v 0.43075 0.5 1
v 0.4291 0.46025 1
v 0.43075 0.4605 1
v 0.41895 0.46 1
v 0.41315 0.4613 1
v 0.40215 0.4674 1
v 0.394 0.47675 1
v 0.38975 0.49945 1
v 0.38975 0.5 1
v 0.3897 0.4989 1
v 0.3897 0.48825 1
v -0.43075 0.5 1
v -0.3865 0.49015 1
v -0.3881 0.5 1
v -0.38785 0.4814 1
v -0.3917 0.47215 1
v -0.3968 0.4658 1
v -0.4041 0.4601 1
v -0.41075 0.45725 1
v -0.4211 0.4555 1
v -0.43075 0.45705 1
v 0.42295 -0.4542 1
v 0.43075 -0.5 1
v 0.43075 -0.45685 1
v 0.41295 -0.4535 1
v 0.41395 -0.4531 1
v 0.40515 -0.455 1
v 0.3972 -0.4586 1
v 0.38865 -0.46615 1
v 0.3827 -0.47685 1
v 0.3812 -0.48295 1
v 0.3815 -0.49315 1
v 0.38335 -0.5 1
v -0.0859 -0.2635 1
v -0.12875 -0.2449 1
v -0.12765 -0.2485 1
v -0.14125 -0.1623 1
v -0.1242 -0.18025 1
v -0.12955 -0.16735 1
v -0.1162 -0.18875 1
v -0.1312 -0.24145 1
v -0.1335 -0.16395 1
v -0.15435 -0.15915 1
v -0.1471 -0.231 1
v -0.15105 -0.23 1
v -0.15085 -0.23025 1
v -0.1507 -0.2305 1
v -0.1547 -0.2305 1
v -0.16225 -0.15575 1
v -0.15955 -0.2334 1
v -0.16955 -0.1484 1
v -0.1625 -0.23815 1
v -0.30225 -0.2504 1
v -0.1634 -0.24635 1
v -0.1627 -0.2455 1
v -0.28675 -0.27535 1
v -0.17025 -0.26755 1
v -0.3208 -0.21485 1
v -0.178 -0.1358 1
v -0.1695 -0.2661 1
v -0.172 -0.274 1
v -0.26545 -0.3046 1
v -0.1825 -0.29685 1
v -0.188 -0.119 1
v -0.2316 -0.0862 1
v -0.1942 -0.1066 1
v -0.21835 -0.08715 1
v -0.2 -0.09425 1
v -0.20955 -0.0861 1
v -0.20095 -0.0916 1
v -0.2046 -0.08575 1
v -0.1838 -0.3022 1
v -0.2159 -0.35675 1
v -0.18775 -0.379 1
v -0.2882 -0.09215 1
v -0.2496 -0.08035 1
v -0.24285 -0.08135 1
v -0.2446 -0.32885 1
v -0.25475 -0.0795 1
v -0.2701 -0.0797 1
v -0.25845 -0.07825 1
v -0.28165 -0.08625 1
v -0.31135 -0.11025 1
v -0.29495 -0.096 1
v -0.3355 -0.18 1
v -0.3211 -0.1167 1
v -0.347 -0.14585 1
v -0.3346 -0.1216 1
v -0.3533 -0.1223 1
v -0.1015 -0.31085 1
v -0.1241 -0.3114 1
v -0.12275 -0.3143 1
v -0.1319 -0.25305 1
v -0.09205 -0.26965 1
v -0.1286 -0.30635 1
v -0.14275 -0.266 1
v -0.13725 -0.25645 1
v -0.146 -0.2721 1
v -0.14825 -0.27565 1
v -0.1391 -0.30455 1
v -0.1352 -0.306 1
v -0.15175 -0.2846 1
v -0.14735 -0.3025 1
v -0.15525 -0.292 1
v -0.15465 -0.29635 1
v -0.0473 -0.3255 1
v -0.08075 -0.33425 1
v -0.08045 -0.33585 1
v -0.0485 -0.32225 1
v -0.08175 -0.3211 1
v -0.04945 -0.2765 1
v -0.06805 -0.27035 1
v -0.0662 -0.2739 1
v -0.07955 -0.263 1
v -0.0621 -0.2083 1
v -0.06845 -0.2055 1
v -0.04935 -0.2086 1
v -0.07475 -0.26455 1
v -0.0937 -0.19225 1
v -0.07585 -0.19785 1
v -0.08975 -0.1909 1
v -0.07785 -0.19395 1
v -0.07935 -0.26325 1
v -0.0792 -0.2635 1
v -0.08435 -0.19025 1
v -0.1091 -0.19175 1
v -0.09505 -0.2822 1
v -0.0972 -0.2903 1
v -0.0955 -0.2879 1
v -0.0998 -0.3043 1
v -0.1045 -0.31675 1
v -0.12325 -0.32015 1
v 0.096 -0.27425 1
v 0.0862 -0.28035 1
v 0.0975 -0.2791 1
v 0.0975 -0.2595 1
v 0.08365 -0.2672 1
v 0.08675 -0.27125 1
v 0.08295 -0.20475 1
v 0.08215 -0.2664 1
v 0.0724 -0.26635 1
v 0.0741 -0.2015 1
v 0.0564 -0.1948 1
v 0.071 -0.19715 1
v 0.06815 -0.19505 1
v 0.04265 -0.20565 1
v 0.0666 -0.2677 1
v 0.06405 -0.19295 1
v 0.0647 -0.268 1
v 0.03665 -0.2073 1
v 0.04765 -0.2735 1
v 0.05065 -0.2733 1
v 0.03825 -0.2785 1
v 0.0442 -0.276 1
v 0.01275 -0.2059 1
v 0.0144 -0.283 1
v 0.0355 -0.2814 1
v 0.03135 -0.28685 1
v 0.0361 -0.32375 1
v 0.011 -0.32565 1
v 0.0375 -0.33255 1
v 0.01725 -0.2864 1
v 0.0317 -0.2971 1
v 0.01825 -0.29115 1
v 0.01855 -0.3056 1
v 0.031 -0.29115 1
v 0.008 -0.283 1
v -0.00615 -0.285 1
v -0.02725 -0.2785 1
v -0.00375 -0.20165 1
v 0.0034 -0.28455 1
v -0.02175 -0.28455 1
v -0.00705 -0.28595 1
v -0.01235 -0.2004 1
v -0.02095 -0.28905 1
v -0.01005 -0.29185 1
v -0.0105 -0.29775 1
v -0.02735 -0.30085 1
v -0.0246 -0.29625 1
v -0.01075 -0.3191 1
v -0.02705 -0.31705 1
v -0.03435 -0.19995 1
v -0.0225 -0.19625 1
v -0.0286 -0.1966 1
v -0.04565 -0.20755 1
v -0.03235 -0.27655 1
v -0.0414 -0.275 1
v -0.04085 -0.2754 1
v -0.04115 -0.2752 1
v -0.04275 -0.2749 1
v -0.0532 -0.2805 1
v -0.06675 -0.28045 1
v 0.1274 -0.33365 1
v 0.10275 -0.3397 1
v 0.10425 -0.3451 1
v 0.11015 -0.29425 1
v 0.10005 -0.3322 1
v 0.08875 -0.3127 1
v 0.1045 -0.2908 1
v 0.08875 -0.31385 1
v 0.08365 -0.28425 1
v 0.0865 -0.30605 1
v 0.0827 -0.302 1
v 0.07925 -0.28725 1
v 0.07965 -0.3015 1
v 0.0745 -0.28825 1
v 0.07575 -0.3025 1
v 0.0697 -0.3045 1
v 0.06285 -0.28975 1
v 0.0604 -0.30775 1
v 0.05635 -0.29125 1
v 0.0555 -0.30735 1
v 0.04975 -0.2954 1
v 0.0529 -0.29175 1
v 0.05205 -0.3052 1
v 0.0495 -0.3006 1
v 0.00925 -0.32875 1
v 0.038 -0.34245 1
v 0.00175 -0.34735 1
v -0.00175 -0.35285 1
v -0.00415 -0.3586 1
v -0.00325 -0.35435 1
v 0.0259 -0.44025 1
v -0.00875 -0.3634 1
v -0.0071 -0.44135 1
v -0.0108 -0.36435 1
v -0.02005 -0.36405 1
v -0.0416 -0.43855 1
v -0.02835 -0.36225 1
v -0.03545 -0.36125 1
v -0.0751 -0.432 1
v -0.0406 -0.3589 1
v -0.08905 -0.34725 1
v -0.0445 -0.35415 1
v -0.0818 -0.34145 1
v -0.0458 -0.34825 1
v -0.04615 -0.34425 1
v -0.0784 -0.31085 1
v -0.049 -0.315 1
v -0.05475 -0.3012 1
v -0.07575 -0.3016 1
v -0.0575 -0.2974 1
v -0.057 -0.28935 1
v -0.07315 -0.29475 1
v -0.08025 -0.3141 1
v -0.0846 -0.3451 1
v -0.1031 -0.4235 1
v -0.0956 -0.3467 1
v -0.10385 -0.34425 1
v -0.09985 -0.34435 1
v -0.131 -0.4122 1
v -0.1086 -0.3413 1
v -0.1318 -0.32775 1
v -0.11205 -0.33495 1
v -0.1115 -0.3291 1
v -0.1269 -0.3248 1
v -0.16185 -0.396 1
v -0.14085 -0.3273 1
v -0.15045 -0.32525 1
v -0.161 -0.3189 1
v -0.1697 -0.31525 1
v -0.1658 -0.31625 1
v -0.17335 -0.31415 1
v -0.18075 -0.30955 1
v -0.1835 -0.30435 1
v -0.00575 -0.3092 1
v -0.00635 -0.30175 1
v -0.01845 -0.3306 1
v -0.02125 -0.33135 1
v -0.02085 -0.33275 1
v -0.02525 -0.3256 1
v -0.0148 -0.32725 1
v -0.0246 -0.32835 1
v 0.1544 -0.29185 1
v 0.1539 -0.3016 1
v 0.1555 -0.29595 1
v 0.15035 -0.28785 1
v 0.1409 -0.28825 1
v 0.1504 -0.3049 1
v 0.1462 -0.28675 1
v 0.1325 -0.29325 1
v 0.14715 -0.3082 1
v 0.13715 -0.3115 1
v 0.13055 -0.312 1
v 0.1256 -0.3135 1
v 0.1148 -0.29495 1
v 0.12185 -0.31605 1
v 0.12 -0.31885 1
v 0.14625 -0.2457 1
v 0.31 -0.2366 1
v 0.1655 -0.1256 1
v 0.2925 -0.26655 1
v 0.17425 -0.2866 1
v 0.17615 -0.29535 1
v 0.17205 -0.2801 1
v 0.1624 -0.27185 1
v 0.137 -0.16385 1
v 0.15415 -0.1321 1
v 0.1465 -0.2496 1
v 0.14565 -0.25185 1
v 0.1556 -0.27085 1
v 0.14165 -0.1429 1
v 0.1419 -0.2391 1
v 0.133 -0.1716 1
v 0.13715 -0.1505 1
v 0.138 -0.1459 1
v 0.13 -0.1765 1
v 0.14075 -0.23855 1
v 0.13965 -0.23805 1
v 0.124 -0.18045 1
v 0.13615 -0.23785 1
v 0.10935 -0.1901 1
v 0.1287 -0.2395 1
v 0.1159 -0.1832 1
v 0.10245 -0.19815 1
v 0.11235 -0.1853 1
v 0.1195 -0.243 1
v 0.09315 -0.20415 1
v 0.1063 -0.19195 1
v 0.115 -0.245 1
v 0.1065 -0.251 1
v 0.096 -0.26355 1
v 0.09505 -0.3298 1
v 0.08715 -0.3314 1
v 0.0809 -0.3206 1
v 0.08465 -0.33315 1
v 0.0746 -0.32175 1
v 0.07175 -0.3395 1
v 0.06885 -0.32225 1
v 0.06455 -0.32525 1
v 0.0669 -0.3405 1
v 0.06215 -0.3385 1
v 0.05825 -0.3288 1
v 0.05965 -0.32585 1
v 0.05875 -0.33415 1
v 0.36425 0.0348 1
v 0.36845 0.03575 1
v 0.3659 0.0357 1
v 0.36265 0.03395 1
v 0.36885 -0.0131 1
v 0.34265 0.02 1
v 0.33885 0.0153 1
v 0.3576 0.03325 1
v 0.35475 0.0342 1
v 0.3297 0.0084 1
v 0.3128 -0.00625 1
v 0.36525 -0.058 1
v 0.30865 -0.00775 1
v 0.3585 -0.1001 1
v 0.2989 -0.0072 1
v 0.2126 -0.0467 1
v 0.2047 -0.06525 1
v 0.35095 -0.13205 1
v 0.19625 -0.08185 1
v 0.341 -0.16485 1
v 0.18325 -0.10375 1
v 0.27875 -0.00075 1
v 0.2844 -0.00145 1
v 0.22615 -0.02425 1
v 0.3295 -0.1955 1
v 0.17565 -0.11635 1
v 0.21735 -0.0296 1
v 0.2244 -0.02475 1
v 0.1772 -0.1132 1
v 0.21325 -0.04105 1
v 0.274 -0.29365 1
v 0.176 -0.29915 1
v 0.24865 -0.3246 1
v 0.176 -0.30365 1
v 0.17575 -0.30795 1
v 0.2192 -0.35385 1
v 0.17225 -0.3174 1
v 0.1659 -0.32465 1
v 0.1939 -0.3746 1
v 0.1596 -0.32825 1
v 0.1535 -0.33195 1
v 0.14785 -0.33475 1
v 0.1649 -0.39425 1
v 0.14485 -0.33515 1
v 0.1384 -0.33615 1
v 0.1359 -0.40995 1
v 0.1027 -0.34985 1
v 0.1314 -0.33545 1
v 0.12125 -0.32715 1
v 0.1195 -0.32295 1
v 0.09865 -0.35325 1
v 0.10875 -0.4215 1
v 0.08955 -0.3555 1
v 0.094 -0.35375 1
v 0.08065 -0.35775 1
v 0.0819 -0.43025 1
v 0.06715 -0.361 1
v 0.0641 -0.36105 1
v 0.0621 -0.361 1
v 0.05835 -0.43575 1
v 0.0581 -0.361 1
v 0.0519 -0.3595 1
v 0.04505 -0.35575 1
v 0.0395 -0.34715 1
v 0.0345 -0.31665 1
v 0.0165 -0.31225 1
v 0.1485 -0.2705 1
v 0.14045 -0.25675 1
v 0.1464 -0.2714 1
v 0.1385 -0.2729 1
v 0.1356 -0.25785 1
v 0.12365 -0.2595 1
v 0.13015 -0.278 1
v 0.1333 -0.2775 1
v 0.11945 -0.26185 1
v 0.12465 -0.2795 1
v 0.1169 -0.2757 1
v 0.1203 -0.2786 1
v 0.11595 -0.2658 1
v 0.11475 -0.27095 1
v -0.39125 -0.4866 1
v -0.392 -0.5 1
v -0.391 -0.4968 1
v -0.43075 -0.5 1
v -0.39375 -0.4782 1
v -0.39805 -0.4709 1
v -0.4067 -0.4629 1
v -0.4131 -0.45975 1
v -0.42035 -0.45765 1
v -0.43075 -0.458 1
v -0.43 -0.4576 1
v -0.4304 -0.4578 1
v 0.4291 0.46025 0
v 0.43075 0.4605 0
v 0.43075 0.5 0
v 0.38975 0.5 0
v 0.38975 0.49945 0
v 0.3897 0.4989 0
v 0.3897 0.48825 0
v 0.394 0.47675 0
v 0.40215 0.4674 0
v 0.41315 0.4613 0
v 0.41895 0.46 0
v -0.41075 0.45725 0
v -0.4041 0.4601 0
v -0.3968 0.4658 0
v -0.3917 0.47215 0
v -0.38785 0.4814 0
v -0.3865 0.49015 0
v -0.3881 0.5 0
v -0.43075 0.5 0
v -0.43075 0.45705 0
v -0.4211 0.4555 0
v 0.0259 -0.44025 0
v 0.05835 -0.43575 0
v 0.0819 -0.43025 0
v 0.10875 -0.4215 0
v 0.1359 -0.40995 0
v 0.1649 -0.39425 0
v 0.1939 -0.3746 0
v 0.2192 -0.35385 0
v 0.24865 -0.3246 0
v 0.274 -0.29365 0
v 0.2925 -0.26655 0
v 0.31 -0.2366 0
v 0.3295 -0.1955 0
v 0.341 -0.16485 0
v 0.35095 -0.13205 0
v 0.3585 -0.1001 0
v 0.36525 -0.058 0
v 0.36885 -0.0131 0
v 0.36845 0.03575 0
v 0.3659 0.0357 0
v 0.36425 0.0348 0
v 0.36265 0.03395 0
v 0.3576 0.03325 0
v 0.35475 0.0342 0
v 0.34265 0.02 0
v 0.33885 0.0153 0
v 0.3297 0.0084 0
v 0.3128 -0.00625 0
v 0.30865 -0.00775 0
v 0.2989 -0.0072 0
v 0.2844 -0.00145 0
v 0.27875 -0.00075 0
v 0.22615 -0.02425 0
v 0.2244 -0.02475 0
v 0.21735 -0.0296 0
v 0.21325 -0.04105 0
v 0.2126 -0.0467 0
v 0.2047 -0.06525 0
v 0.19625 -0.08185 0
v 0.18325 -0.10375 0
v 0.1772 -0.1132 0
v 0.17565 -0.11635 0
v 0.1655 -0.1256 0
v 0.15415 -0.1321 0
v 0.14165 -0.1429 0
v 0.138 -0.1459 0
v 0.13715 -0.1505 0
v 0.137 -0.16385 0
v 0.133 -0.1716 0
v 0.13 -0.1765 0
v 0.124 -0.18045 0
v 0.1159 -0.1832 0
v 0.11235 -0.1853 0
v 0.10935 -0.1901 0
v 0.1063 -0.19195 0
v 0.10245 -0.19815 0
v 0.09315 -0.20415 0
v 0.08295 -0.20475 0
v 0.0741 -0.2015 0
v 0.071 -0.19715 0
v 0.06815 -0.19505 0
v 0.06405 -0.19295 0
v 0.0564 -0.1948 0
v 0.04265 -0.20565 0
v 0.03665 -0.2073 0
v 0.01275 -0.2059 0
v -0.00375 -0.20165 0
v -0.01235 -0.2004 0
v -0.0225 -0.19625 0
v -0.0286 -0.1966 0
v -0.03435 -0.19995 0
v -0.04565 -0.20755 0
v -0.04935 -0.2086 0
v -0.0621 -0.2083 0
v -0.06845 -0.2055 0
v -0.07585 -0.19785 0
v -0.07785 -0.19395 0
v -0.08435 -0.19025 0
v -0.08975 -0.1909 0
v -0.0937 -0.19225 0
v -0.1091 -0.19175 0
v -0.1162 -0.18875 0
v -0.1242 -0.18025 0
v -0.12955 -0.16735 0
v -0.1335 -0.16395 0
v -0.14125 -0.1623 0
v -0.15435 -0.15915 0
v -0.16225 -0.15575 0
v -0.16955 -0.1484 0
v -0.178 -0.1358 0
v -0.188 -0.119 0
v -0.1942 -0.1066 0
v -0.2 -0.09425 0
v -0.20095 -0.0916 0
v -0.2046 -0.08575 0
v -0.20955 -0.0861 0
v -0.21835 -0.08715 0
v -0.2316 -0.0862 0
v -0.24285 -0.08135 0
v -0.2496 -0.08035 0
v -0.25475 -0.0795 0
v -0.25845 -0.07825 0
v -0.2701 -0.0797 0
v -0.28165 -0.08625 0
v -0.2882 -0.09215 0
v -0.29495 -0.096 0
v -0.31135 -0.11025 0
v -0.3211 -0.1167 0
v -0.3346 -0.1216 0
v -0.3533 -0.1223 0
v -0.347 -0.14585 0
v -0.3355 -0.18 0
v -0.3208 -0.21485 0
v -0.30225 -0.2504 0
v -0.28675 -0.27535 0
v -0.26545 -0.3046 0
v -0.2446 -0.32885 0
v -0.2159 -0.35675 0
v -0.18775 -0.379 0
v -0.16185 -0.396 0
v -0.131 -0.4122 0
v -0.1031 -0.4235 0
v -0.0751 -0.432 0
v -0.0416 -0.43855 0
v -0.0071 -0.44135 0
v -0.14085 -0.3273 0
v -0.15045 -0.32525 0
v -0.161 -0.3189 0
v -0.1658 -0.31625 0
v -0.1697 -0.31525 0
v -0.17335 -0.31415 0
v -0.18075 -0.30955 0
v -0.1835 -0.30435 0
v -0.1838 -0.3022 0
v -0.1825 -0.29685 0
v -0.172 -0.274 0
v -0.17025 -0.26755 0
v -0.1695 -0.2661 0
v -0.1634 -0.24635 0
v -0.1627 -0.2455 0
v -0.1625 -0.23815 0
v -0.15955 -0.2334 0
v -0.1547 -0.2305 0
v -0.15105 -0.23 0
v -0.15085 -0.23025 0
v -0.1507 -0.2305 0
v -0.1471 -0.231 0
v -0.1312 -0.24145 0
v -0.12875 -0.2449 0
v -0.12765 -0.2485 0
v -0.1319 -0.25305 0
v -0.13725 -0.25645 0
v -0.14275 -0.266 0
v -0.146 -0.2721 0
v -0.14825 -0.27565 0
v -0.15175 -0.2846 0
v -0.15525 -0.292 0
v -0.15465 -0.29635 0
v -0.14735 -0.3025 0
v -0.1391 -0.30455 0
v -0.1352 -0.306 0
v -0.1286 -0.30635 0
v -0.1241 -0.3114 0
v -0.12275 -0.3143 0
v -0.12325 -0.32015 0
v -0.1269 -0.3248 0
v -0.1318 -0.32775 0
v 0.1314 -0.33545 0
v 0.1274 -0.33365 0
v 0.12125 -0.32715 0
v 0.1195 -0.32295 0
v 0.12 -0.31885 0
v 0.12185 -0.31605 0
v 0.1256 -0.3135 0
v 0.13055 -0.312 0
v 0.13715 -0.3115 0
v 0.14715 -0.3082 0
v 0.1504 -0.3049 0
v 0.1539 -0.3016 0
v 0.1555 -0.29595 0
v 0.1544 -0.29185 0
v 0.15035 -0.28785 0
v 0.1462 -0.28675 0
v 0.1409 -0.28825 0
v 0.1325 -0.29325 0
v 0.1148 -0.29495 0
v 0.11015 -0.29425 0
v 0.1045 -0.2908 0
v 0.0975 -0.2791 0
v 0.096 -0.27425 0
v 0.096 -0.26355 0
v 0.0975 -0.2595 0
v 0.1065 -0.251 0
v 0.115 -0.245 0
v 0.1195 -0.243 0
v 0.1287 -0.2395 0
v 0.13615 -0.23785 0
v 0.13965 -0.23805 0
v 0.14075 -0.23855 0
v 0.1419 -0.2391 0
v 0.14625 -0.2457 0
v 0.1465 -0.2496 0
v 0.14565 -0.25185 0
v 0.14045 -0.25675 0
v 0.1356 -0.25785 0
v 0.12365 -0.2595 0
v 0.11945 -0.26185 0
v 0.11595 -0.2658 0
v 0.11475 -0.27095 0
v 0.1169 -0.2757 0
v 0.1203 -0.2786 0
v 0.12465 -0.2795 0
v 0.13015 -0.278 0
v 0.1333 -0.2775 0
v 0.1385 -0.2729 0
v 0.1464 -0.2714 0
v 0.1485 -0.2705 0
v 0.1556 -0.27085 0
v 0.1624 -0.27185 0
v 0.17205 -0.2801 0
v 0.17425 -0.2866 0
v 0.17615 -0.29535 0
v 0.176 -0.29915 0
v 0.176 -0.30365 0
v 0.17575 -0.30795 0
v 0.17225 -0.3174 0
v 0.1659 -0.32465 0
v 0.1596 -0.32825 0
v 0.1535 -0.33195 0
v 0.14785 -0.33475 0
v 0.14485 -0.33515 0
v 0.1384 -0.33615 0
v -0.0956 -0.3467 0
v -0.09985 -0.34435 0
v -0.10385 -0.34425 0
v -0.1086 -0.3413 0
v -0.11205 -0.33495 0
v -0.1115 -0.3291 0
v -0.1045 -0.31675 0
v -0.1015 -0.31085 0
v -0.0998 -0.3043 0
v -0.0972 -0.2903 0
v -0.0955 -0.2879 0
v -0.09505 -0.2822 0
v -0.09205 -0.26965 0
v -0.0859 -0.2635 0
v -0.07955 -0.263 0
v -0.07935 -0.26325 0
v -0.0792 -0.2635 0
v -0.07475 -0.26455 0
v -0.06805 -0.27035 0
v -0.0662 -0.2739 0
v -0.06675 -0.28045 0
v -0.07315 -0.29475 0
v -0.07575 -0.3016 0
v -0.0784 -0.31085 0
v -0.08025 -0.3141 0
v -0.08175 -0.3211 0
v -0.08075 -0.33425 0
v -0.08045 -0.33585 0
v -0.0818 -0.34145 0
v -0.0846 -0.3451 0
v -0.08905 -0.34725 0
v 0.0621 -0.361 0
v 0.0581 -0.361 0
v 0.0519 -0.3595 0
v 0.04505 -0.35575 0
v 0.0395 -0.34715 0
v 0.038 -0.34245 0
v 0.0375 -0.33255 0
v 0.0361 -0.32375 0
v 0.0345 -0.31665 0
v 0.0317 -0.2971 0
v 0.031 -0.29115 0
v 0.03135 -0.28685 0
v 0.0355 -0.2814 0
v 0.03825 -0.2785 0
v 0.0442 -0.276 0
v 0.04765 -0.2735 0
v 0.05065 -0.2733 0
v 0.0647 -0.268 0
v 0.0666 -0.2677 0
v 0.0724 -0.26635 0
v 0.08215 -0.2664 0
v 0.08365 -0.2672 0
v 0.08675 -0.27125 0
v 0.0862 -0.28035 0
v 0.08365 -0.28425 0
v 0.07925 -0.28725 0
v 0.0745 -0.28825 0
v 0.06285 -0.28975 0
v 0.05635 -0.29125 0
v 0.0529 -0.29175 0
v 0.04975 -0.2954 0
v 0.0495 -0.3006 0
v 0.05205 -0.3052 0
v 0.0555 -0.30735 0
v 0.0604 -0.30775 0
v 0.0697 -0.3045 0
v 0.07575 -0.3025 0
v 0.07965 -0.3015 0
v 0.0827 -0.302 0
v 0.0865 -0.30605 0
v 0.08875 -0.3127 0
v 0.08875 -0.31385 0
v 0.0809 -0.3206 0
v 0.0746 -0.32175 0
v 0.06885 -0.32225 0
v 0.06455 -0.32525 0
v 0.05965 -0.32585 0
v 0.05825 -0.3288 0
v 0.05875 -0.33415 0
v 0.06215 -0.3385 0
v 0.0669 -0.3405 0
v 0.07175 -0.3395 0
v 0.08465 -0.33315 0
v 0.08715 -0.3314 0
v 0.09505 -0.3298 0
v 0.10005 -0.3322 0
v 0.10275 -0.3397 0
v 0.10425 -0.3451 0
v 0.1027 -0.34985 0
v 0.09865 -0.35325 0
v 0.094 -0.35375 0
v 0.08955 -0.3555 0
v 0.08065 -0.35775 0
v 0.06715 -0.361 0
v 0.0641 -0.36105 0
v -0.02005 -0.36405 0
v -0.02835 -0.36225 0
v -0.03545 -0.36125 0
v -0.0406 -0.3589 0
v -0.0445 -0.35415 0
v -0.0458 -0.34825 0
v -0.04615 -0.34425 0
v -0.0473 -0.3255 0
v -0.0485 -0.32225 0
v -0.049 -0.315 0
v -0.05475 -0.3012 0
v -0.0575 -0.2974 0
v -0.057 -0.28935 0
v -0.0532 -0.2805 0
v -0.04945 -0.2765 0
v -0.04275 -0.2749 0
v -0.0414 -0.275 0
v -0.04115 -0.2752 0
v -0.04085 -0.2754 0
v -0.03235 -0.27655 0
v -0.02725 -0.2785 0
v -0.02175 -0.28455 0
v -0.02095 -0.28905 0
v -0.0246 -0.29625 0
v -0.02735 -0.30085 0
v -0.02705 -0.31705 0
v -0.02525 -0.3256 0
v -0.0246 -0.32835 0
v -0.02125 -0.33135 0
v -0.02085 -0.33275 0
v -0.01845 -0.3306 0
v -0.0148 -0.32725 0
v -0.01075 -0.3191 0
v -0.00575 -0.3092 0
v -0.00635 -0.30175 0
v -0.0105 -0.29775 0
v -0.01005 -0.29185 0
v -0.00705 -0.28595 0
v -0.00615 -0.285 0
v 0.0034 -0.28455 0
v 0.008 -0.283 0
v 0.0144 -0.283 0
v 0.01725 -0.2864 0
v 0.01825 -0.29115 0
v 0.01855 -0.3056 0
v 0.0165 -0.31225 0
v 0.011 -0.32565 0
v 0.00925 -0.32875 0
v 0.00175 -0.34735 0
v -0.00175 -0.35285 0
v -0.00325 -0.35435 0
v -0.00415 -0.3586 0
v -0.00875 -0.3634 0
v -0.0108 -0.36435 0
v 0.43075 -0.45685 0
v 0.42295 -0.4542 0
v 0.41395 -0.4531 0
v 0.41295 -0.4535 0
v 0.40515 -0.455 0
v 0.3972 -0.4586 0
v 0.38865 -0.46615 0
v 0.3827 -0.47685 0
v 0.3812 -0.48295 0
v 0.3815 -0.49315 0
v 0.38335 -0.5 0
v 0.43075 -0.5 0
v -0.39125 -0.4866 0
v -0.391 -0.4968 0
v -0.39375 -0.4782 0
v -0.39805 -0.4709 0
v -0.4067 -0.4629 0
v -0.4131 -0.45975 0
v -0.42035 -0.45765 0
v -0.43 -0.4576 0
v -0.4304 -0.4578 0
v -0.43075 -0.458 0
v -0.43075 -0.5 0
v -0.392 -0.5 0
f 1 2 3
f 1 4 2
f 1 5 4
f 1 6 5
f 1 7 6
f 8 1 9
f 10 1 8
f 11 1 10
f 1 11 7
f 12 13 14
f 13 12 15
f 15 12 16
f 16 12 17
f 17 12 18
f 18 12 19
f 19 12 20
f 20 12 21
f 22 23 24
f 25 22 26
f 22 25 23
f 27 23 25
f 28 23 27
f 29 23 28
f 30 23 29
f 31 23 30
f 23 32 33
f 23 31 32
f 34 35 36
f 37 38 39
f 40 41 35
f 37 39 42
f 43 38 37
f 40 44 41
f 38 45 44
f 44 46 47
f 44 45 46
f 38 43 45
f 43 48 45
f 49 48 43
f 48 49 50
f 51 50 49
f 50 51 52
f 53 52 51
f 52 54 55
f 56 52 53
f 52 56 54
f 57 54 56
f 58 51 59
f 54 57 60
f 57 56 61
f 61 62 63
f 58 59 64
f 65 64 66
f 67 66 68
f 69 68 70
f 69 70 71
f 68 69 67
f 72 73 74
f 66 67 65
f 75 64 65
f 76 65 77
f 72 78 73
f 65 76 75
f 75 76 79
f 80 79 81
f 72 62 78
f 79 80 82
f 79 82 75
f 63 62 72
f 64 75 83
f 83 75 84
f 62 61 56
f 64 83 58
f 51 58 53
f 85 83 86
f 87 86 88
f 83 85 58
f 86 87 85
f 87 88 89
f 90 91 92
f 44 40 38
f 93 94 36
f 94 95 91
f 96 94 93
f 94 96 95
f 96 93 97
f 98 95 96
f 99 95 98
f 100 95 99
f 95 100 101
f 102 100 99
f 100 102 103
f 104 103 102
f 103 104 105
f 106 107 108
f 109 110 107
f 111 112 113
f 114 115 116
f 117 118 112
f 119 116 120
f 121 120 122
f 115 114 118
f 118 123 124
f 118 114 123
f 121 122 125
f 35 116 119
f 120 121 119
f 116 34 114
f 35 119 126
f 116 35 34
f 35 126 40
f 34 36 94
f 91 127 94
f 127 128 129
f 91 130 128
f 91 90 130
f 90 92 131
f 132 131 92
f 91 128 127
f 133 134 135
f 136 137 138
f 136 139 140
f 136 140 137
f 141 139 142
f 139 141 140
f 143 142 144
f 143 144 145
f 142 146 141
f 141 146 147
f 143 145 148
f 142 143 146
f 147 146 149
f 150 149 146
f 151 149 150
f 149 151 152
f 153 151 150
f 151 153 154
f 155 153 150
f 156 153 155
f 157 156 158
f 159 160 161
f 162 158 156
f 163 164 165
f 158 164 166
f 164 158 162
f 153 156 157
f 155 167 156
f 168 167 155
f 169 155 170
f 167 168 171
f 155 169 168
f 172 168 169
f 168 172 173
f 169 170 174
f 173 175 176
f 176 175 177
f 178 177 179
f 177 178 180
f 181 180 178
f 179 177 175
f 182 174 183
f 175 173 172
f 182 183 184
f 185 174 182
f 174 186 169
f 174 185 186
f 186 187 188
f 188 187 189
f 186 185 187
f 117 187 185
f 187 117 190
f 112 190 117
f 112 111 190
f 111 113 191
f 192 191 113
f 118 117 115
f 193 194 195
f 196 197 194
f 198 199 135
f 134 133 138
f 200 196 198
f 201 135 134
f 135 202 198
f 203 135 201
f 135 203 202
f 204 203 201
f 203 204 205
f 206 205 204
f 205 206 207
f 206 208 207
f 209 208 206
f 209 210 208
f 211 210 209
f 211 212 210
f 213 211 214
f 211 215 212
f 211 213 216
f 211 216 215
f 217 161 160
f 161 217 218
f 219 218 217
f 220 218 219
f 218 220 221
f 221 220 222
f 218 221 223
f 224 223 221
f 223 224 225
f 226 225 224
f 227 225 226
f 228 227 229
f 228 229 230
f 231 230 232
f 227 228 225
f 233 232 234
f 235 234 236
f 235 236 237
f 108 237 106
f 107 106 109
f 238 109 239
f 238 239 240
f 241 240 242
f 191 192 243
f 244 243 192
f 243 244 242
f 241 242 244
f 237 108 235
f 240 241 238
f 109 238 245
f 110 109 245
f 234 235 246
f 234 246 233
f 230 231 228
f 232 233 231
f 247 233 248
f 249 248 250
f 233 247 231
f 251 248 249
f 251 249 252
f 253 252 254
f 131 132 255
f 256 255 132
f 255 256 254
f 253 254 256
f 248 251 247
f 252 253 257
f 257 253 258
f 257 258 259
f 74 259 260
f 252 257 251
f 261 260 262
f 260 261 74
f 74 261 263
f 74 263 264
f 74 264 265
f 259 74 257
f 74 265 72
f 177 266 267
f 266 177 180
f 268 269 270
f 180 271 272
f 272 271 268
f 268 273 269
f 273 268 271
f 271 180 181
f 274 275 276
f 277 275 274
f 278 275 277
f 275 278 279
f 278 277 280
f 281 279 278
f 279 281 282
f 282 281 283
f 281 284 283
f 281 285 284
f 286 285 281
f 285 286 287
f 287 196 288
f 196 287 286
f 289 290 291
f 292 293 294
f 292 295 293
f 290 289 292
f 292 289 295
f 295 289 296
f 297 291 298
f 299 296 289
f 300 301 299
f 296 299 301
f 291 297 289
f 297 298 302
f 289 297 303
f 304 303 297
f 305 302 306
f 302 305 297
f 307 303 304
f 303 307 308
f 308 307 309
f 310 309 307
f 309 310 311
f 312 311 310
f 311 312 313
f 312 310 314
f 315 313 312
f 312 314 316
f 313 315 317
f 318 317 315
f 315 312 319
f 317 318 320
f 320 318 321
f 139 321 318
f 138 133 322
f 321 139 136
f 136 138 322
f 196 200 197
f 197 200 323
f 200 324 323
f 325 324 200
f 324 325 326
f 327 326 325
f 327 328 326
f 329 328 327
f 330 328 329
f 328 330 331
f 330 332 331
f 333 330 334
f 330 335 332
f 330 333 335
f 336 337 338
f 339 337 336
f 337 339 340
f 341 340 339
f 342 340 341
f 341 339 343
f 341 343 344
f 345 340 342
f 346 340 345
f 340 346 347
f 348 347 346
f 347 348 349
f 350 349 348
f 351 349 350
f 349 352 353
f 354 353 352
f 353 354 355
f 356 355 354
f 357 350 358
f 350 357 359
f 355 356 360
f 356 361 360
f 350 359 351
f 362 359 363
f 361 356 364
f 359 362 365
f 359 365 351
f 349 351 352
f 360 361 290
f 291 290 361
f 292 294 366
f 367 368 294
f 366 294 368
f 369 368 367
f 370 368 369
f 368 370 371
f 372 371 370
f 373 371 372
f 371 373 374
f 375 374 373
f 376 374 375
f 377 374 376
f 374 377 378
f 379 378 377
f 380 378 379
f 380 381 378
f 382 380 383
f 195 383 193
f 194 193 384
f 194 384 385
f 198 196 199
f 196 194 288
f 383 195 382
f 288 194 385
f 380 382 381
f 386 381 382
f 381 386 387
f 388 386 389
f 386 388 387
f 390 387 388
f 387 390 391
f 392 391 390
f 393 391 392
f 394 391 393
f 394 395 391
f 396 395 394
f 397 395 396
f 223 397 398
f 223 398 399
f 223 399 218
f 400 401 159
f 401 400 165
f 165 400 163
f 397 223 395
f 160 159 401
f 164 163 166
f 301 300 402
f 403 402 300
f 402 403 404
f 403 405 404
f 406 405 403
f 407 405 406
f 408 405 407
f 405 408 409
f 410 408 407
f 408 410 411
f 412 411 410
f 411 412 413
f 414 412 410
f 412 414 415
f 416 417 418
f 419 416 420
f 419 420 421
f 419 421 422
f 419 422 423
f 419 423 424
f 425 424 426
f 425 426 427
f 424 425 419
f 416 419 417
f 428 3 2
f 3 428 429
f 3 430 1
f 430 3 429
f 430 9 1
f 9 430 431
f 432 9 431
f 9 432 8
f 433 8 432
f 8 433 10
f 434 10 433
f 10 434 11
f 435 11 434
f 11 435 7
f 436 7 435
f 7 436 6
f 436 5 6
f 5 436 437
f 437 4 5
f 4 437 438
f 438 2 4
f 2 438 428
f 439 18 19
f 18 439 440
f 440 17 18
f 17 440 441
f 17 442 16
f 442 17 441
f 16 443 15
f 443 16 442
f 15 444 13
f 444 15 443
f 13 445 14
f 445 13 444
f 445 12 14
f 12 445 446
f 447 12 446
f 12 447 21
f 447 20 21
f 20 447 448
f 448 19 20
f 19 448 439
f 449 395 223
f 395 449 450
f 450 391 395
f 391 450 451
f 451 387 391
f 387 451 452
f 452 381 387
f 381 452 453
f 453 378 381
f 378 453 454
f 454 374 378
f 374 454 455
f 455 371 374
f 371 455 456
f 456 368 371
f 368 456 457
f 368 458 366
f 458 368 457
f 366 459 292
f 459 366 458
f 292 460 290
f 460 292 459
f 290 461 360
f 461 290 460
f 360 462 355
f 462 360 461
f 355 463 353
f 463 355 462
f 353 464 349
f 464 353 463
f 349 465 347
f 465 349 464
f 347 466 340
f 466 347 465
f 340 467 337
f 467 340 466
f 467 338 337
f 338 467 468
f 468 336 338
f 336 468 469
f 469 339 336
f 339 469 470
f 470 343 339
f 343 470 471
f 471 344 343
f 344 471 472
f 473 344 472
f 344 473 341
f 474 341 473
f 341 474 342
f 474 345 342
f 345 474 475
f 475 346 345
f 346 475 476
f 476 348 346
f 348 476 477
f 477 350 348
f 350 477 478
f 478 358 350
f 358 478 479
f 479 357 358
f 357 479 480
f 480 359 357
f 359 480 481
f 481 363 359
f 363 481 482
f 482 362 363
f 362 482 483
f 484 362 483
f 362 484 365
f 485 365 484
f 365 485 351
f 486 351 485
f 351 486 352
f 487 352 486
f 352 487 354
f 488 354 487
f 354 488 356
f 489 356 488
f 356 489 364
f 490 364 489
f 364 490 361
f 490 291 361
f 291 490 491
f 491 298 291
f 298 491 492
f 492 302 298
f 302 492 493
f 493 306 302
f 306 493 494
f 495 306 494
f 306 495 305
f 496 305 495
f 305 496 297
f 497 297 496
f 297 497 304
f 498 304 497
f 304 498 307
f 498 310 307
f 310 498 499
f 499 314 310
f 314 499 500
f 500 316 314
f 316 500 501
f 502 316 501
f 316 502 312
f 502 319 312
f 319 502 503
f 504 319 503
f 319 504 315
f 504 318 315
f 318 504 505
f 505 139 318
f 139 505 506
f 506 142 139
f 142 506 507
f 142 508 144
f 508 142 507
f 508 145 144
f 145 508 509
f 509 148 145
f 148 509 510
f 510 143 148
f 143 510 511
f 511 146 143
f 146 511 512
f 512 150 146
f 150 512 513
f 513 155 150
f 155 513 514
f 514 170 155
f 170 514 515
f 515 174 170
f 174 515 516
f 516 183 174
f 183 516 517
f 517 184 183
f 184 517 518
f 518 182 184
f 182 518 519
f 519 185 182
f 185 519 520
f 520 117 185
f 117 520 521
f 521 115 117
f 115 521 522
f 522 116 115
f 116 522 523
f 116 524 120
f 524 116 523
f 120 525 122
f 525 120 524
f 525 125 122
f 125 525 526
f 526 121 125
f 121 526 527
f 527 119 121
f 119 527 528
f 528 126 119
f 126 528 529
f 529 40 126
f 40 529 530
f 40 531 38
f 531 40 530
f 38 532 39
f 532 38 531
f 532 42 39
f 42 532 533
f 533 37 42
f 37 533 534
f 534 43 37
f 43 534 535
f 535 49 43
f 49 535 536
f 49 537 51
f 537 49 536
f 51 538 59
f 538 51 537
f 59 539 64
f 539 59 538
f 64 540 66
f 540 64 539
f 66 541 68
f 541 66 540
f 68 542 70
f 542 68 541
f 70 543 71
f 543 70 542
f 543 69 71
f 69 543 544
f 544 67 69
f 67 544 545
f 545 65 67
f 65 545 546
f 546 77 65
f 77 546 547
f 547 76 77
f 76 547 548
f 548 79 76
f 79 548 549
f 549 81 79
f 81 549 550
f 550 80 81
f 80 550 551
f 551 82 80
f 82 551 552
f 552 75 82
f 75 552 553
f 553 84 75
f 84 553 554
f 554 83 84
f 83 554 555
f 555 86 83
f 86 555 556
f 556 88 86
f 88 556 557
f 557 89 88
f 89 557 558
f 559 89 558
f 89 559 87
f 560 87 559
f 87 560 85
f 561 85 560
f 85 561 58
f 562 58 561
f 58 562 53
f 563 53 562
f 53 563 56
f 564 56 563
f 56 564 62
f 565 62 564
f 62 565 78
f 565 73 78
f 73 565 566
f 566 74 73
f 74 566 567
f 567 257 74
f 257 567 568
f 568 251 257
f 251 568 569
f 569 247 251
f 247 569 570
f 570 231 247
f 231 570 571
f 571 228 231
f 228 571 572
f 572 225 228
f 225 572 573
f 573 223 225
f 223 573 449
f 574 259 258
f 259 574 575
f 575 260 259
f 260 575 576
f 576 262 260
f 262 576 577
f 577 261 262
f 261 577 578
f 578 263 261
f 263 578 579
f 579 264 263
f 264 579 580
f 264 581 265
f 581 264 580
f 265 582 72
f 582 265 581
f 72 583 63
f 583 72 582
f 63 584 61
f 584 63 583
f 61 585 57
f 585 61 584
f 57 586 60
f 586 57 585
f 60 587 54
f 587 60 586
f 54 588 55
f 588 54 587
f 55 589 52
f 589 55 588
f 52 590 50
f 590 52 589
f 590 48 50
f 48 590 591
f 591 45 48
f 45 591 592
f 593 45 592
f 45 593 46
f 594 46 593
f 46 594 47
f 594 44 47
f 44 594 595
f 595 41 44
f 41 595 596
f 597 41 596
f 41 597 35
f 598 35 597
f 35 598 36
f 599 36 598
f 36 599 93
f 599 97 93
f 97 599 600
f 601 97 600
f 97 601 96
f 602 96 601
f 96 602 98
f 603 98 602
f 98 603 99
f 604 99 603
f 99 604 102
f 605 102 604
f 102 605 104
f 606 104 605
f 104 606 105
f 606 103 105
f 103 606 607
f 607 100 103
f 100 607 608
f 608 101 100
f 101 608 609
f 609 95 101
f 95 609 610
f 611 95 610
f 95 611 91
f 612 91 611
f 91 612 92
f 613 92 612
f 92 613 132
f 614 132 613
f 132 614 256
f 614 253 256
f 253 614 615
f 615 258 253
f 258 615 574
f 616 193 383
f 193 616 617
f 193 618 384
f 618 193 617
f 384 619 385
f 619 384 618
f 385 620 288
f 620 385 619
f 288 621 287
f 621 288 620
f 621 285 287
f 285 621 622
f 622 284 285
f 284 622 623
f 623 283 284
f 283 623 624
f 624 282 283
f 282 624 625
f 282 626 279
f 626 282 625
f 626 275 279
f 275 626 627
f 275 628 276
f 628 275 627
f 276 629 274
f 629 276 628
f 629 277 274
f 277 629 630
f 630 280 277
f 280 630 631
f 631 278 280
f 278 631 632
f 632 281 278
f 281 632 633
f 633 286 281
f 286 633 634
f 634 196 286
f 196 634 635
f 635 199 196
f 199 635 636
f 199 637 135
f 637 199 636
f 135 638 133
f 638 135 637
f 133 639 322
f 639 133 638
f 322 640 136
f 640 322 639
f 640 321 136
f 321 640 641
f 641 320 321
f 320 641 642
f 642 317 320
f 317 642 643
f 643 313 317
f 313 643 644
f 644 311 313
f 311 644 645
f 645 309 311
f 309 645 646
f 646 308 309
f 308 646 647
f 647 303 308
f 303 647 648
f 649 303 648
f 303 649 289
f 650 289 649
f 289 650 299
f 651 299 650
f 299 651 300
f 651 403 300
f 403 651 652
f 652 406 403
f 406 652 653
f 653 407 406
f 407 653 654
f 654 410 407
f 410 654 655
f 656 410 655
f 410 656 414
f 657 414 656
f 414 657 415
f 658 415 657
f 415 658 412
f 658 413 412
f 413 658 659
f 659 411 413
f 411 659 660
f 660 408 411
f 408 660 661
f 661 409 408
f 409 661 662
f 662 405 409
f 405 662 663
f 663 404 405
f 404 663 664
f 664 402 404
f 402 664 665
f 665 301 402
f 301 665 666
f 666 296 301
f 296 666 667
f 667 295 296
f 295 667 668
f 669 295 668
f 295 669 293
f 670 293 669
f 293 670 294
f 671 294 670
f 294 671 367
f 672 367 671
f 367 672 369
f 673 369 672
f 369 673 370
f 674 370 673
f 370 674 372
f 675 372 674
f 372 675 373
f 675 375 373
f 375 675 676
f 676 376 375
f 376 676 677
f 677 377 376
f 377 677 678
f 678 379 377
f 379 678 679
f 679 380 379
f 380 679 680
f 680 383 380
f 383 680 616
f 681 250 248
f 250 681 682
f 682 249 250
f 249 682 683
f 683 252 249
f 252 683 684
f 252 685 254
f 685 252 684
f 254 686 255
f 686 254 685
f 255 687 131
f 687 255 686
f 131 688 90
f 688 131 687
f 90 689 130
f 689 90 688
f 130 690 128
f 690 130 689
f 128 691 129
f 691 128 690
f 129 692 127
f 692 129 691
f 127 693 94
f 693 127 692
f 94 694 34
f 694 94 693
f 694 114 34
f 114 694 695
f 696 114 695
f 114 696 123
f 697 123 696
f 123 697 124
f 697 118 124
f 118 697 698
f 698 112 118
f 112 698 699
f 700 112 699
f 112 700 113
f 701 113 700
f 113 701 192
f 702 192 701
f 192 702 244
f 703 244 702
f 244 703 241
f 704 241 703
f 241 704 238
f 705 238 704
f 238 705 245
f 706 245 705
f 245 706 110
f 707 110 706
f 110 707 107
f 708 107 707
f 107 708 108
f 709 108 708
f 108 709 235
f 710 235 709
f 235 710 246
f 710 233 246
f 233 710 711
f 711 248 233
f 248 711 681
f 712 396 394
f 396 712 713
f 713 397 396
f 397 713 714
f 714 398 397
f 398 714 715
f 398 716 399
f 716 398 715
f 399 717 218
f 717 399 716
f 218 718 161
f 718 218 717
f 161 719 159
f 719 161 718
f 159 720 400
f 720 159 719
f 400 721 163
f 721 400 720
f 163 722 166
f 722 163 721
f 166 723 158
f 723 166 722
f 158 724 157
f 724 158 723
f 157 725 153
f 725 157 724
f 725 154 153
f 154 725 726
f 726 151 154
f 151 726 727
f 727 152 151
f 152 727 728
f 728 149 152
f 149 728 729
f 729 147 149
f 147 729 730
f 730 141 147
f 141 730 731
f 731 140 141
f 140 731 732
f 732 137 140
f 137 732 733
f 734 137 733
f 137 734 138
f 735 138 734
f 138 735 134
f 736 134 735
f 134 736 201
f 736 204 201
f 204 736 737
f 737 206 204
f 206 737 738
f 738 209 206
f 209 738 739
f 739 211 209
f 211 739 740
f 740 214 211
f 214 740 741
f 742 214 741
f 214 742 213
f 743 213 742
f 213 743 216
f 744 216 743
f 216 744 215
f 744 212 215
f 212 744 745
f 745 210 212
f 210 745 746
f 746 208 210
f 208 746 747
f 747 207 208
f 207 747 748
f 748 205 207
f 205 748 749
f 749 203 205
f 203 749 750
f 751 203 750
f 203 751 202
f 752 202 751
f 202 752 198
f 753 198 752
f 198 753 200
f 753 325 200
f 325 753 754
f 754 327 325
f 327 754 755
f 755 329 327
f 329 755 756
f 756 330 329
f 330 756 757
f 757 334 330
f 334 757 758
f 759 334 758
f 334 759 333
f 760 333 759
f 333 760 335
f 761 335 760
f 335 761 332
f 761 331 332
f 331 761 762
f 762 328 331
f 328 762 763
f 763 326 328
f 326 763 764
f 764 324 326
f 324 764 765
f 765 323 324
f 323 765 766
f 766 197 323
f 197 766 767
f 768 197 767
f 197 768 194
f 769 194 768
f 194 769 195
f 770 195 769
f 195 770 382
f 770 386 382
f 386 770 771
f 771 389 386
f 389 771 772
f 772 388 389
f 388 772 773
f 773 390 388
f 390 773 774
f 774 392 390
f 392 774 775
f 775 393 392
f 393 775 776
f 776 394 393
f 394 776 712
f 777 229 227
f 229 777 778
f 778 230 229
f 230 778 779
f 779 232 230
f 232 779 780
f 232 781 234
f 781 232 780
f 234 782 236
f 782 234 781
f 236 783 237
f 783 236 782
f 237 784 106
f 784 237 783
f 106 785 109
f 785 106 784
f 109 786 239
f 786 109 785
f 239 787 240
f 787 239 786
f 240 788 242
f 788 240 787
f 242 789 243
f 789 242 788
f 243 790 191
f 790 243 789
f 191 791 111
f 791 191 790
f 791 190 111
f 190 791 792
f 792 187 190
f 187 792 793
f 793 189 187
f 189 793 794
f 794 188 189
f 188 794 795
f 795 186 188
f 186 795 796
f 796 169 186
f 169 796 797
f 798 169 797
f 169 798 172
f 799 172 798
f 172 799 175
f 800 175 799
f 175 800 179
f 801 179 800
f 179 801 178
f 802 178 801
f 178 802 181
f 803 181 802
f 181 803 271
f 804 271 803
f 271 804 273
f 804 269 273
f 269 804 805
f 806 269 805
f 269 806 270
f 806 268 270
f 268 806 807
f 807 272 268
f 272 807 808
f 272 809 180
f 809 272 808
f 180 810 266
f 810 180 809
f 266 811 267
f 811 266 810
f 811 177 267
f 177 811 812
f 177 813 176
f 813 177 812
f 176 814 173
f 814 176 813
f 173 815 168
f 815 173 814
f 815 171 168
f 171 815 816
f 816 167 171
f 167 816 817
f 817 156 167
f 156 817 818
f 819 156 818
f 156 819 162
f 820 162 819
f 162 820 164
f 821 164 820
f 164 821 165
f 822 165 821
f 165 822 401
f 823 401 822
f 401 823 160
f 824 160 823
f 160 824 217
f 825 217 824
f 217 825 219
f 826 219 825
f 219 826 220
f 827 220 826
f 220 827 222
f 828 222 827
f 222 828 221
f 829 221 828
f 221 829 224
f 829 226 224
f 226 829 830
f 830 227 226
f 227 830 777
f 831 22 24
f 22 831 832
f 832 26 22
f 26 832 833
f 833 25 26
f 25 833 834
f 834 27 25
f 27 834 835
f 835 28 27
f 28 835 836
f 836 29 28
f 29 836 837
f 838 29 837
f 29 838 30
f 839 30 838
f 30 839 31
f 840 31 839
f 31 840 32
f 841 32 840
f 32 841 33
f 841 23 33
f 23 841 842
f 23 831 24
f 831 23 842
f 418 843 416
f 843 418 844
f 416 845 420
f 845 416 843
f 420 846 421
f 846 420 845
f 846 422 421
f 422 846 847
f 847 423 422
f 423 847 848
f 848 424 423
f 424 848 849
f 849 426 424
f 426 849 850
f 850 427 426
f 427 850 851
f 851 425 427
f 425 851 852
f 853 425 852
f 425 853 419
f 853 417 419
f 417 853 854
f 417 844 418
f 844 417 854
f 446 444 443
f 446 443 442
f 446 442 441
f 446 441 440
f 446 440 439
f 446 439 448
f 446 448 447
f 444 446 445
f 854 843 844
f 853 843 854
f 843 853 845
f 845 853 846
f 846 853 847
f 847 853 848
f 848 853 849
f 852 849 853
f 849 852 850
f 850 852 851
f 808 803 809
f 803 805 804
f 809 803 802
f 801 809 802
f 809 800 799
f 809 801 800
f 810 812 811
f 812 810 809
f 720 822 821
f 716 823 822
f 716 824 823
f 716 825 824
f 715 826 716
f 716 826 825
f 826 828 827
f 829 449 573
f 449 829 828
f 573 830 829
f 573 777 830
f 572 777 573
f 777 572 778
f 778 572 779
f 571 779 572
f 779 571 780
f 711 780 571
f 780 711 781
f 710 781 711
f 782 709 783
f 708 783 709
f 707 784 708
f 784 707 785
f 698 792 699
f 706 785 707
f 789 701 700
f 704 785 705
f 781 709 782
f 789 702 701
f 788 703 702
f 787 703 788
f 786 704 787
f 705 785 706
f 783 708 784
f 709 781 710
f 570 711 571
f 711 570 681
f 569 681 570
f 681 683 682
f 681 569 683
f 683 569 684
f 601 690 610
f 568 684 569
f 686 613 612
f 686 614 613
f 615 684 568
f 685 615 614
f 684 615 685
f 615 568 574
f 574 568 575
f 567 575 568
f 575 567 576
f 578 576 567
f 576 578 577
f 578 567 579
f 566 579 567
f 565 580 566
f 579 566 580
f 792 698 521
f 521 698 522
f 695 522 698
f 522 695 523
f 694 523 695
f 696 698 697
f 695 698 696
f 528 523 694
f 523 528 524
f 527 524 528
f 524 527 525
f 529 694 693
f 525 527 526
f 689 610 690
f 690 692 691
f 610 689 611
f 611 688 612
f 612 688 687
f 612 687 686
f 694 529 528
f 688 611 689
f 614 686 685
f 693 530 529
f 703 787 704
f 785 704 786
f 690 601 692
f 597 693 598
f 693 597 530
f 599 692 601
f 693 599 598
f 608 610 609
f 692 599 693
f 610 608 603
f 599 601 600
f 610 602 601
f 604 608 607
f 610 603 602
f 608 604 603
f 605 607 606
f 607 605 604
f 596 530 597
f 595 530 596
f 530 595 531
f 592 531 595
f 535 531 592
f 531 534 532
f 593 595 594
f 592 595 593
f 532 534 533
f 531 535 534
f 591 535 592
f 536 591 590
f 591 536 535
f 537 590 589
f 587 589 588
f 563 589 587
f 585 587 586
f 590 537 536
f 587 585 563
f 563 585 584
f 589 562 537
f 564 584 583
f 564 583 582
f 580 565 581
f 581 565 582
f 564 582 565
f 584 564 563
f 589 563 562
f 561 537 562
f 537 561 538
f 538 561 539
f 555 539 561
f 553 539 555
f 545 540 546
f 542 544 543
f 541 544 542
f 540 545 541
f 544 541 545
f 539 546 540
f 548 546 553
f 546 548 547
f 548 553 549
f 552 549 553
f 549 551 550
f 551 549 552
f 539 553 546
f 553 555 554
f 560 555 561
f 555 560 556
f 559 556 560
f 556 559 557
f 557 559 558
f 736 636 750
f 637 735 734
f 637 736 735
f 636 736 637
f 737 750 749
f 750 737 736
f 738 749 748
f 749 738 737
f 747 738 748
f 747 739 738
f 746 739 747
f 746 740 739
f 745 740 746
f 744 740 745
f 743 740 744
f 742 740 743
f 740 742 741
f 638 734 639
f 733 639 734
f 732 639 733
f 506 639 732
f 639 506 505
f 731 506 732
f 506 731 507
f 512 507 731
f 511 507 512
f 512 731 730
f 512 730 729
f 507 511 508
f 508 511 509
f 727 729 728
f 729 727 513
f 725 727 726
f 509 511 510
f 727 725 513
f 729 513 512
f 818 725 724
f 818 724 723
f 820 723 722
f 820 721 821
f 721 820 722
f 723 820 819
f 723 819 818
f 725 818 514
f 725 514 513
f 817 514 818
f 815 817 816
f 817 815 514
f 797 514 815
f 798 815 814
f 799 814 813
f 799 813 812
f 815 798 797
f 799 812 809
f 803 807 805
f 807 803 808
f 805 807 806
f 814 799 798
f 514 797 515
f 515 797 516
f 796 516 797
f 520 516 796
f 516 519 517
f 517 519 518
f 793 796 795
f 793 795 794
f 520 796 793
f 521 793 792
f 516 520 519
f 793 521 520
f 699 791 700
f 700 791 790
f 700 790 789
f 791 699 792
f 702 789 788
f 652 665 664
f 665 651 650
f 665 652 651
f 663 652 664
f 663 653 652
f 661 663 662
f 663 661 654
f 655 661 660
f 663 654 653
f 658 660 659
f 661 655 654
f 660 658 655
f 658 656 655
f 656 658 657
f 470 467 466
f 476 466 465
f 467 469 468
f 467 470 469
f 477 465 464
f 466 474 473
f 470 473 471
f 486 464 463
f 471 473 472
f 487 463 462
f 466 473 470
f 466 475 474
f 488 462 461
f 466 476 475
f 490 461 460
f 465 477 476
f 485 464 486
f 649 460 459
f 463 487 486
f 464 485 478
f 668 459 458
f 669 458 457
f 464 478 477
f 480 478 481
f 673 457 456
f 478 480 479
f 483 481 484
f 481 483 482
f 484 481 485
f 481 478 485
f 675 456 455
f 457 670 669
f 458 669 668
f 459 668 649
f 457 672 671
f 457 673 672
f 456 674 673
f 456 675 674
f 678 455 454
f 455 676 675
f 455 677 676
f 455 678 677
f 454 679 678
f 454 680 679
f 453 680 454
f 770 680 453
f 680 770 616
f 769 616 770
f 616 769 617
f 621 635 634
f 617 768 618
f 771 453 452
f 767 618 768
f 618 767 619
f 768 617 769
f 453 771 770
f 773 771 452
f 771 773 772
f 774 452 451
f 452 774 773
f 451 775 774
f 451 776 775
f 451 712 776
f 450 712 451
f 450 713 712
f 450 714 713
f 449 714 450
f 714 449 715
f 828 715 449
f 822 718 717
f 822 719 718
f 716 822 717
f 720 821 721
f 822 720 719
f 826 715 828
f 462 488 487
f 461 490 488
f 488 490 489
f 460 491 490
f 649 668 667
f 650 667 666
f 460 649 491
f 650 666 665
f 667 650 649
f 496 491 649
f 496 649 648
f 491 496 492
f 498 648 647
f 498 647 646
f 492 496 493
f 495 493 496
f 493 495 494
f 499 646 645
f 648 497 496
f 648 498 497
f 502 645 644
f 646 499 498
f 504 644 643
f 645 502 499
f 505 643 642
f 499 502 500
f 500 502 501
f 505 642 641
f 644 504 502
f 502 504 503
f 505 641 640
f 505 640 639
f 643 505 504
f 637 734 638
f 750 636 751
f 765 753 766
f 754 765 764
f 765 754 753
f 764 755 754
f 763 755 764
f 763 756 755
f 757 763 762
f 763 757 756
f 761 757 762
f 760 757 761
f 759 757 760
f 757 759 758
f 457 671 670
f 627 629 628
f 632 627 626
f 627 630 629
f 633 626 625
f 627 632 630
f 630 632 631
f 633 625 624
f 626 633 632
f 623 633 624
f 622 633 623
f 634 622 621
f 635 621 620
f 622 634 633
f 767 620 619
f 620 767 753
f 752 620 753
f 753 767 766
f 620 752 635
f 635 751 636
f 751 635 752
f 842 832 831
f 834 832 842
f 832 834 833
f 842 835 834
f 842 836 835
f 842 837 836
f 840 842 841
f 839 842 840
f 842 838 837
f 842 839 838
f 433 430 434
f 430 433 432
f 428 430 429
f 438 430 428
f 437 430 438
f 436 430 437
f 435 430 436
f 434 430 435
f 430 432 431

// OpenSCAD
module Hedwig2green_1()
{
 /* Generated by trace2scad version 20150415
    http://aggregate.org/MAKE/TRACE2SCAD/
    Optimized model has 431/3926 original points
 */
 color([0.5, 0.5, 0.5])
 assign(minx=0) /* polygon minx=0 */
 assign(miny=0) /* polygon miny=0 */
 assign(maxx=17230) /* polygon maxx=17230 */
 assign(maxy=20000) /* polygon maxy=20000 */
 assign(dx=maxx-minx)
 assign(dy=maxy-miny)
 assign(maxd=((dx>dy)?dx:dy))
 scale([1/maxd, 1/maxd, 1])
 translate([-minx-dx/2, -miny-dy/2, 0])
 linear_extrude(height=1, convexity=431)
 union() {
  union() {
   polygon([[0,19571],[0,19141],[193,19110],[400,19145],[533,19202],[679,19316],[781,19443],[858,19628],[885,19803],[853,20000],[0,20000]], convexity=5);
   polygon([[16410,19989],[16409,19978],[16409,19765],[16495,19535],[16658,19348],[16878,19226],[16994,19200],[17197,19205],[17230,19210],[17230,20000],[16410,20000]], convexity=6);
   union() {
    difference() {
     polygon([[15900,10696],[15868,10679],[15767,10665],[15710,10684],[15468,10400],[15392,10306],[15209,10168],[14871,9875],[14788,9845],[14593,9856],[14303,9971],[14190,9985],[13138,9515],[13103,9505],[12962,9408],[12880,9179],[12867,9066],[12709,8695],[12540,8363],[12280,7925],[12159,7736],[12128,7673],[11925,7488],[11698,7358],[11448,7142],[11375,7082],[11358,6990],[11355,6723],[11275,6568],[11215,6470],[11095,6391],[10933,6336],[10862,6294],[10802,6198],[10741,6161],[10664,6037],[10478,5917],[10274,5905],[10097,5970],[10035,6057],[9978,6099],[9896,6141],[9743,6104],[9468,5887],[9348,5854],[8870,5882],[8540,5967],[8368,5992],[8165,6075],[8043,6068],[7928,6001],[7702,5849],[7628,5828],[7373,5834],[7246,5890],[7098,6043],[7058,6121],[6928,6195],[6820,6182],[6741,6155],[6433,6165],[6291,6225],[6131,6395],[6024,6653],[5945,6721],[5790,6754],[5528,6817],[5370,6885],[5224,7032],[5055,7284],[4855,7620],[4731,7868],[4615,8115],[4596,8168],[4523,8285],[4424,8278],[4248,8257],[3983,8276],[3758,8373],[3623,8393],[3520,8410],[3446,8435],[3213,8406],[2982,8275],[2851,8157],[2716,8080],[2388,7795],[2193,7666],[1923,7568],[1549,7554],[1675,7083],[1905,6400],[2199,5703],[2570,4992],[2880,4493],[3306,3908],[3723,3423],[4297,2865],[4860,2420],[5378,2080],[5995,1756],[6553,1530],[7113,1360],[7783,1229],[8473,1173],[9133,1195],[9782,1285],[10253,1395],[10790,1570],[11333,1801],[11913,2115],[12493,2508],[12999,2923],[13588,3508],[14095,4127],[14465,4669],[14815,5268],[15205,6090],[15435,6703],[15634,7359],[15785,7998],[15920,8840],[15992,9738],[15984,10715],[15933,10714]], convexity=21);
     polygon([[5598,5395],[5601,5390],[5673,5380],[5991,5171],[6040,5102],[6062,5030],[5977,4939],[5870,4871],[5760,4680],[5695,4558],[5650,4487],[5580,4308],[5510,4160],[5522,4073],[5668,3950],[5833,3909],[5911,3880],[6043,3873],[6133,3772],[6160,3714],[6150,3597],[6077,3504],[5979,3445],[5798,3454],[5606,3495],[5395,3622],[5299,3675],[5221,3695],[5148,3717],[5000,3809],[4945,3913],[4939,3956],[4965,4063],[5175,4520],[5210,4649],[5225,4678],[5347,5073],[5361,5090],[5365,5237],[5424,5332],[5521,5390],[5594,5400]], convexity=8);
     polygon([[11430,5229],[11453,5218],[11540,5086],[11545,5008],[11528,4963],[11424,4865],[11327,4843],[11088,4810],[11004,4763],[10934,4684],[10910,4581],[10953,4486],[11021,4428],[11108,4410],[11218,4440],[11281,4450],[11385,4542],[11543,4572],[11585,4590],[11727,4583],[11863,4563],[12056,4398],[12100,4268],[12138,4093],[12135,4017],[12135,3927],[12130,3841],[12060,3652],[11933,3507],[11807,3435],[11685,3361],[11572,3305],[11512,3297],[11383,3277],[11243,3291],[11163,3327],[11040,3457],[11005,3541],[11015,3623],[11052,3679],[11127,3730],[11226,3760],[11358,3770],[11558,3836],[11623,3902],[11693,3968],[11725,4081],[11703,4163],[11622,4243],[11539,4265],[11433,4235],[11265,4135],[10911,4101],[10818,4115],[10705,4184],[10565,4418],[10535,4515],[10535,4729],[10565,4810],[10745,4980],[10915,5100],[11005,5140],[11189,5210],[11338,5243],[11408,5239]], convexity=17);
     polygon([[7028,4735],[7031,4730],[7120,4709],[7254,4593],[7291,4522],[7280,4391],[7152,4105],[7100,3968],[7047,3783],[7010,3718],[6980,3578],[7000,3315],[7006,3283],[6979,3171],[6923,3098],[6834,3055],[6703,3066],[6618,3113],[6538,3115],[6443,3174],[6374,3301],[6385,3418],[6525,3665],[6585,3783],[6619,3914],[6671,4194],[6705,4242],[6714,4356],[6774,4607],[6897,4730],[7024,4740]], convexity=8);
     polygon([[10273,4664],[10288,4656],[10350,4575],[10339,4393],[10288,4315],[10200,4255],[10105,4235],[9872,4205],[9742,4175],[9673,4165],[9610,4092],[9605,3988],[9656,3896],[9725,3853],[9823,3845],[10009,3910],[10130,3950],[10208,3970],[10269,3960],[10345,3879],[10390,3746],[10390,3723],[10233,3588],[10107,3565],[9992,3555],[9906,3495],[9808,3483],[9780,3424],[9790,3317],[9858,3230],[9953,3190],[10050,3210],[10308,3337],[10358,3372],[10516,3404],[10616,3356],[10670,3206],[10700,3098],[10669,3003],[10588,2935],[10495,2925],[10406,2890],[10228,2845],[9958,2780],[9897,2779],[9857,2780],[9818,2780],[9777,2780],[9653,2810],[9516,2885],[9405,3057],[9375,3151],[9365,3349],[9337,3525],[9305,3667],[9249,4058],[9235,4177],[9242,4263],[9325,4372],[9380,4430],[9499,4480],[9568,4530],[9628,4534],[9909,4640],[9947,4646],[10063,4673],[10258,4672]], convexity=15);
     polygon([[7792,4496],[7798,4492],[7968,4469],[8070,4430],[8180,4309],[8196,4219],[8123,4075],[8068,3983],[8074,3659],[8110,3488],[8123,3433],[8190,3373],[8198,3345],[8246,3388],[8319,3455],[8400,3618],[8500,3816],[8488,3965],[8405,4045],[8414,4163],[8474,4281],[8492,4300],[8683,4309],[8775,4340],[8903,4340],[8960,4272],[8980,4177],[8986,3888],[8945,3755],[8835,3487],[8800,3425],[8650,3053],[8580,2943],[8550,2913],[8532,2828],[8440,2732],[8399,2713],[8214,2719],[8048,2755],[7906,2775],[7803,2822],[7725,2917],[7699,3035],[7692,3115],[7669,3490],[7645,3555],[7635,3700],[7520,3976],[7465,4052],[7475,4213],[7551,4390],[7626,4470],[7760,4502],[7787,4500]], convexity=13);
    }
   }
   polygon([[16884,934],[16874,930],[16718,900],[16559,828],[16388,677],[16269,463],[16239,341],[16245,137],[16282,0],[17230,0],[17230,863],[17074,916],[16894,938]], convexity=6);
   polygon([[7,844],[0,840],[0,0],[775,0],[795,64],[790,268],[740,436],[654,582],[481,742],[353,805],[208,847],[15,848]], convexity=6);
  }
 }
}

module Hedwig2green()
{
 /* all layers combined, scaled to within a 1mm cube */
 scale([1, 1, 1/1])
 difference() {
  union() {
   scale([1,1,2]) translate([0,0,-0.5]) Hedwig2green_1();
  }
  translate([0,0,-2]) cube([2,2,4],center=true);
 }
}
Hedwig2green();
